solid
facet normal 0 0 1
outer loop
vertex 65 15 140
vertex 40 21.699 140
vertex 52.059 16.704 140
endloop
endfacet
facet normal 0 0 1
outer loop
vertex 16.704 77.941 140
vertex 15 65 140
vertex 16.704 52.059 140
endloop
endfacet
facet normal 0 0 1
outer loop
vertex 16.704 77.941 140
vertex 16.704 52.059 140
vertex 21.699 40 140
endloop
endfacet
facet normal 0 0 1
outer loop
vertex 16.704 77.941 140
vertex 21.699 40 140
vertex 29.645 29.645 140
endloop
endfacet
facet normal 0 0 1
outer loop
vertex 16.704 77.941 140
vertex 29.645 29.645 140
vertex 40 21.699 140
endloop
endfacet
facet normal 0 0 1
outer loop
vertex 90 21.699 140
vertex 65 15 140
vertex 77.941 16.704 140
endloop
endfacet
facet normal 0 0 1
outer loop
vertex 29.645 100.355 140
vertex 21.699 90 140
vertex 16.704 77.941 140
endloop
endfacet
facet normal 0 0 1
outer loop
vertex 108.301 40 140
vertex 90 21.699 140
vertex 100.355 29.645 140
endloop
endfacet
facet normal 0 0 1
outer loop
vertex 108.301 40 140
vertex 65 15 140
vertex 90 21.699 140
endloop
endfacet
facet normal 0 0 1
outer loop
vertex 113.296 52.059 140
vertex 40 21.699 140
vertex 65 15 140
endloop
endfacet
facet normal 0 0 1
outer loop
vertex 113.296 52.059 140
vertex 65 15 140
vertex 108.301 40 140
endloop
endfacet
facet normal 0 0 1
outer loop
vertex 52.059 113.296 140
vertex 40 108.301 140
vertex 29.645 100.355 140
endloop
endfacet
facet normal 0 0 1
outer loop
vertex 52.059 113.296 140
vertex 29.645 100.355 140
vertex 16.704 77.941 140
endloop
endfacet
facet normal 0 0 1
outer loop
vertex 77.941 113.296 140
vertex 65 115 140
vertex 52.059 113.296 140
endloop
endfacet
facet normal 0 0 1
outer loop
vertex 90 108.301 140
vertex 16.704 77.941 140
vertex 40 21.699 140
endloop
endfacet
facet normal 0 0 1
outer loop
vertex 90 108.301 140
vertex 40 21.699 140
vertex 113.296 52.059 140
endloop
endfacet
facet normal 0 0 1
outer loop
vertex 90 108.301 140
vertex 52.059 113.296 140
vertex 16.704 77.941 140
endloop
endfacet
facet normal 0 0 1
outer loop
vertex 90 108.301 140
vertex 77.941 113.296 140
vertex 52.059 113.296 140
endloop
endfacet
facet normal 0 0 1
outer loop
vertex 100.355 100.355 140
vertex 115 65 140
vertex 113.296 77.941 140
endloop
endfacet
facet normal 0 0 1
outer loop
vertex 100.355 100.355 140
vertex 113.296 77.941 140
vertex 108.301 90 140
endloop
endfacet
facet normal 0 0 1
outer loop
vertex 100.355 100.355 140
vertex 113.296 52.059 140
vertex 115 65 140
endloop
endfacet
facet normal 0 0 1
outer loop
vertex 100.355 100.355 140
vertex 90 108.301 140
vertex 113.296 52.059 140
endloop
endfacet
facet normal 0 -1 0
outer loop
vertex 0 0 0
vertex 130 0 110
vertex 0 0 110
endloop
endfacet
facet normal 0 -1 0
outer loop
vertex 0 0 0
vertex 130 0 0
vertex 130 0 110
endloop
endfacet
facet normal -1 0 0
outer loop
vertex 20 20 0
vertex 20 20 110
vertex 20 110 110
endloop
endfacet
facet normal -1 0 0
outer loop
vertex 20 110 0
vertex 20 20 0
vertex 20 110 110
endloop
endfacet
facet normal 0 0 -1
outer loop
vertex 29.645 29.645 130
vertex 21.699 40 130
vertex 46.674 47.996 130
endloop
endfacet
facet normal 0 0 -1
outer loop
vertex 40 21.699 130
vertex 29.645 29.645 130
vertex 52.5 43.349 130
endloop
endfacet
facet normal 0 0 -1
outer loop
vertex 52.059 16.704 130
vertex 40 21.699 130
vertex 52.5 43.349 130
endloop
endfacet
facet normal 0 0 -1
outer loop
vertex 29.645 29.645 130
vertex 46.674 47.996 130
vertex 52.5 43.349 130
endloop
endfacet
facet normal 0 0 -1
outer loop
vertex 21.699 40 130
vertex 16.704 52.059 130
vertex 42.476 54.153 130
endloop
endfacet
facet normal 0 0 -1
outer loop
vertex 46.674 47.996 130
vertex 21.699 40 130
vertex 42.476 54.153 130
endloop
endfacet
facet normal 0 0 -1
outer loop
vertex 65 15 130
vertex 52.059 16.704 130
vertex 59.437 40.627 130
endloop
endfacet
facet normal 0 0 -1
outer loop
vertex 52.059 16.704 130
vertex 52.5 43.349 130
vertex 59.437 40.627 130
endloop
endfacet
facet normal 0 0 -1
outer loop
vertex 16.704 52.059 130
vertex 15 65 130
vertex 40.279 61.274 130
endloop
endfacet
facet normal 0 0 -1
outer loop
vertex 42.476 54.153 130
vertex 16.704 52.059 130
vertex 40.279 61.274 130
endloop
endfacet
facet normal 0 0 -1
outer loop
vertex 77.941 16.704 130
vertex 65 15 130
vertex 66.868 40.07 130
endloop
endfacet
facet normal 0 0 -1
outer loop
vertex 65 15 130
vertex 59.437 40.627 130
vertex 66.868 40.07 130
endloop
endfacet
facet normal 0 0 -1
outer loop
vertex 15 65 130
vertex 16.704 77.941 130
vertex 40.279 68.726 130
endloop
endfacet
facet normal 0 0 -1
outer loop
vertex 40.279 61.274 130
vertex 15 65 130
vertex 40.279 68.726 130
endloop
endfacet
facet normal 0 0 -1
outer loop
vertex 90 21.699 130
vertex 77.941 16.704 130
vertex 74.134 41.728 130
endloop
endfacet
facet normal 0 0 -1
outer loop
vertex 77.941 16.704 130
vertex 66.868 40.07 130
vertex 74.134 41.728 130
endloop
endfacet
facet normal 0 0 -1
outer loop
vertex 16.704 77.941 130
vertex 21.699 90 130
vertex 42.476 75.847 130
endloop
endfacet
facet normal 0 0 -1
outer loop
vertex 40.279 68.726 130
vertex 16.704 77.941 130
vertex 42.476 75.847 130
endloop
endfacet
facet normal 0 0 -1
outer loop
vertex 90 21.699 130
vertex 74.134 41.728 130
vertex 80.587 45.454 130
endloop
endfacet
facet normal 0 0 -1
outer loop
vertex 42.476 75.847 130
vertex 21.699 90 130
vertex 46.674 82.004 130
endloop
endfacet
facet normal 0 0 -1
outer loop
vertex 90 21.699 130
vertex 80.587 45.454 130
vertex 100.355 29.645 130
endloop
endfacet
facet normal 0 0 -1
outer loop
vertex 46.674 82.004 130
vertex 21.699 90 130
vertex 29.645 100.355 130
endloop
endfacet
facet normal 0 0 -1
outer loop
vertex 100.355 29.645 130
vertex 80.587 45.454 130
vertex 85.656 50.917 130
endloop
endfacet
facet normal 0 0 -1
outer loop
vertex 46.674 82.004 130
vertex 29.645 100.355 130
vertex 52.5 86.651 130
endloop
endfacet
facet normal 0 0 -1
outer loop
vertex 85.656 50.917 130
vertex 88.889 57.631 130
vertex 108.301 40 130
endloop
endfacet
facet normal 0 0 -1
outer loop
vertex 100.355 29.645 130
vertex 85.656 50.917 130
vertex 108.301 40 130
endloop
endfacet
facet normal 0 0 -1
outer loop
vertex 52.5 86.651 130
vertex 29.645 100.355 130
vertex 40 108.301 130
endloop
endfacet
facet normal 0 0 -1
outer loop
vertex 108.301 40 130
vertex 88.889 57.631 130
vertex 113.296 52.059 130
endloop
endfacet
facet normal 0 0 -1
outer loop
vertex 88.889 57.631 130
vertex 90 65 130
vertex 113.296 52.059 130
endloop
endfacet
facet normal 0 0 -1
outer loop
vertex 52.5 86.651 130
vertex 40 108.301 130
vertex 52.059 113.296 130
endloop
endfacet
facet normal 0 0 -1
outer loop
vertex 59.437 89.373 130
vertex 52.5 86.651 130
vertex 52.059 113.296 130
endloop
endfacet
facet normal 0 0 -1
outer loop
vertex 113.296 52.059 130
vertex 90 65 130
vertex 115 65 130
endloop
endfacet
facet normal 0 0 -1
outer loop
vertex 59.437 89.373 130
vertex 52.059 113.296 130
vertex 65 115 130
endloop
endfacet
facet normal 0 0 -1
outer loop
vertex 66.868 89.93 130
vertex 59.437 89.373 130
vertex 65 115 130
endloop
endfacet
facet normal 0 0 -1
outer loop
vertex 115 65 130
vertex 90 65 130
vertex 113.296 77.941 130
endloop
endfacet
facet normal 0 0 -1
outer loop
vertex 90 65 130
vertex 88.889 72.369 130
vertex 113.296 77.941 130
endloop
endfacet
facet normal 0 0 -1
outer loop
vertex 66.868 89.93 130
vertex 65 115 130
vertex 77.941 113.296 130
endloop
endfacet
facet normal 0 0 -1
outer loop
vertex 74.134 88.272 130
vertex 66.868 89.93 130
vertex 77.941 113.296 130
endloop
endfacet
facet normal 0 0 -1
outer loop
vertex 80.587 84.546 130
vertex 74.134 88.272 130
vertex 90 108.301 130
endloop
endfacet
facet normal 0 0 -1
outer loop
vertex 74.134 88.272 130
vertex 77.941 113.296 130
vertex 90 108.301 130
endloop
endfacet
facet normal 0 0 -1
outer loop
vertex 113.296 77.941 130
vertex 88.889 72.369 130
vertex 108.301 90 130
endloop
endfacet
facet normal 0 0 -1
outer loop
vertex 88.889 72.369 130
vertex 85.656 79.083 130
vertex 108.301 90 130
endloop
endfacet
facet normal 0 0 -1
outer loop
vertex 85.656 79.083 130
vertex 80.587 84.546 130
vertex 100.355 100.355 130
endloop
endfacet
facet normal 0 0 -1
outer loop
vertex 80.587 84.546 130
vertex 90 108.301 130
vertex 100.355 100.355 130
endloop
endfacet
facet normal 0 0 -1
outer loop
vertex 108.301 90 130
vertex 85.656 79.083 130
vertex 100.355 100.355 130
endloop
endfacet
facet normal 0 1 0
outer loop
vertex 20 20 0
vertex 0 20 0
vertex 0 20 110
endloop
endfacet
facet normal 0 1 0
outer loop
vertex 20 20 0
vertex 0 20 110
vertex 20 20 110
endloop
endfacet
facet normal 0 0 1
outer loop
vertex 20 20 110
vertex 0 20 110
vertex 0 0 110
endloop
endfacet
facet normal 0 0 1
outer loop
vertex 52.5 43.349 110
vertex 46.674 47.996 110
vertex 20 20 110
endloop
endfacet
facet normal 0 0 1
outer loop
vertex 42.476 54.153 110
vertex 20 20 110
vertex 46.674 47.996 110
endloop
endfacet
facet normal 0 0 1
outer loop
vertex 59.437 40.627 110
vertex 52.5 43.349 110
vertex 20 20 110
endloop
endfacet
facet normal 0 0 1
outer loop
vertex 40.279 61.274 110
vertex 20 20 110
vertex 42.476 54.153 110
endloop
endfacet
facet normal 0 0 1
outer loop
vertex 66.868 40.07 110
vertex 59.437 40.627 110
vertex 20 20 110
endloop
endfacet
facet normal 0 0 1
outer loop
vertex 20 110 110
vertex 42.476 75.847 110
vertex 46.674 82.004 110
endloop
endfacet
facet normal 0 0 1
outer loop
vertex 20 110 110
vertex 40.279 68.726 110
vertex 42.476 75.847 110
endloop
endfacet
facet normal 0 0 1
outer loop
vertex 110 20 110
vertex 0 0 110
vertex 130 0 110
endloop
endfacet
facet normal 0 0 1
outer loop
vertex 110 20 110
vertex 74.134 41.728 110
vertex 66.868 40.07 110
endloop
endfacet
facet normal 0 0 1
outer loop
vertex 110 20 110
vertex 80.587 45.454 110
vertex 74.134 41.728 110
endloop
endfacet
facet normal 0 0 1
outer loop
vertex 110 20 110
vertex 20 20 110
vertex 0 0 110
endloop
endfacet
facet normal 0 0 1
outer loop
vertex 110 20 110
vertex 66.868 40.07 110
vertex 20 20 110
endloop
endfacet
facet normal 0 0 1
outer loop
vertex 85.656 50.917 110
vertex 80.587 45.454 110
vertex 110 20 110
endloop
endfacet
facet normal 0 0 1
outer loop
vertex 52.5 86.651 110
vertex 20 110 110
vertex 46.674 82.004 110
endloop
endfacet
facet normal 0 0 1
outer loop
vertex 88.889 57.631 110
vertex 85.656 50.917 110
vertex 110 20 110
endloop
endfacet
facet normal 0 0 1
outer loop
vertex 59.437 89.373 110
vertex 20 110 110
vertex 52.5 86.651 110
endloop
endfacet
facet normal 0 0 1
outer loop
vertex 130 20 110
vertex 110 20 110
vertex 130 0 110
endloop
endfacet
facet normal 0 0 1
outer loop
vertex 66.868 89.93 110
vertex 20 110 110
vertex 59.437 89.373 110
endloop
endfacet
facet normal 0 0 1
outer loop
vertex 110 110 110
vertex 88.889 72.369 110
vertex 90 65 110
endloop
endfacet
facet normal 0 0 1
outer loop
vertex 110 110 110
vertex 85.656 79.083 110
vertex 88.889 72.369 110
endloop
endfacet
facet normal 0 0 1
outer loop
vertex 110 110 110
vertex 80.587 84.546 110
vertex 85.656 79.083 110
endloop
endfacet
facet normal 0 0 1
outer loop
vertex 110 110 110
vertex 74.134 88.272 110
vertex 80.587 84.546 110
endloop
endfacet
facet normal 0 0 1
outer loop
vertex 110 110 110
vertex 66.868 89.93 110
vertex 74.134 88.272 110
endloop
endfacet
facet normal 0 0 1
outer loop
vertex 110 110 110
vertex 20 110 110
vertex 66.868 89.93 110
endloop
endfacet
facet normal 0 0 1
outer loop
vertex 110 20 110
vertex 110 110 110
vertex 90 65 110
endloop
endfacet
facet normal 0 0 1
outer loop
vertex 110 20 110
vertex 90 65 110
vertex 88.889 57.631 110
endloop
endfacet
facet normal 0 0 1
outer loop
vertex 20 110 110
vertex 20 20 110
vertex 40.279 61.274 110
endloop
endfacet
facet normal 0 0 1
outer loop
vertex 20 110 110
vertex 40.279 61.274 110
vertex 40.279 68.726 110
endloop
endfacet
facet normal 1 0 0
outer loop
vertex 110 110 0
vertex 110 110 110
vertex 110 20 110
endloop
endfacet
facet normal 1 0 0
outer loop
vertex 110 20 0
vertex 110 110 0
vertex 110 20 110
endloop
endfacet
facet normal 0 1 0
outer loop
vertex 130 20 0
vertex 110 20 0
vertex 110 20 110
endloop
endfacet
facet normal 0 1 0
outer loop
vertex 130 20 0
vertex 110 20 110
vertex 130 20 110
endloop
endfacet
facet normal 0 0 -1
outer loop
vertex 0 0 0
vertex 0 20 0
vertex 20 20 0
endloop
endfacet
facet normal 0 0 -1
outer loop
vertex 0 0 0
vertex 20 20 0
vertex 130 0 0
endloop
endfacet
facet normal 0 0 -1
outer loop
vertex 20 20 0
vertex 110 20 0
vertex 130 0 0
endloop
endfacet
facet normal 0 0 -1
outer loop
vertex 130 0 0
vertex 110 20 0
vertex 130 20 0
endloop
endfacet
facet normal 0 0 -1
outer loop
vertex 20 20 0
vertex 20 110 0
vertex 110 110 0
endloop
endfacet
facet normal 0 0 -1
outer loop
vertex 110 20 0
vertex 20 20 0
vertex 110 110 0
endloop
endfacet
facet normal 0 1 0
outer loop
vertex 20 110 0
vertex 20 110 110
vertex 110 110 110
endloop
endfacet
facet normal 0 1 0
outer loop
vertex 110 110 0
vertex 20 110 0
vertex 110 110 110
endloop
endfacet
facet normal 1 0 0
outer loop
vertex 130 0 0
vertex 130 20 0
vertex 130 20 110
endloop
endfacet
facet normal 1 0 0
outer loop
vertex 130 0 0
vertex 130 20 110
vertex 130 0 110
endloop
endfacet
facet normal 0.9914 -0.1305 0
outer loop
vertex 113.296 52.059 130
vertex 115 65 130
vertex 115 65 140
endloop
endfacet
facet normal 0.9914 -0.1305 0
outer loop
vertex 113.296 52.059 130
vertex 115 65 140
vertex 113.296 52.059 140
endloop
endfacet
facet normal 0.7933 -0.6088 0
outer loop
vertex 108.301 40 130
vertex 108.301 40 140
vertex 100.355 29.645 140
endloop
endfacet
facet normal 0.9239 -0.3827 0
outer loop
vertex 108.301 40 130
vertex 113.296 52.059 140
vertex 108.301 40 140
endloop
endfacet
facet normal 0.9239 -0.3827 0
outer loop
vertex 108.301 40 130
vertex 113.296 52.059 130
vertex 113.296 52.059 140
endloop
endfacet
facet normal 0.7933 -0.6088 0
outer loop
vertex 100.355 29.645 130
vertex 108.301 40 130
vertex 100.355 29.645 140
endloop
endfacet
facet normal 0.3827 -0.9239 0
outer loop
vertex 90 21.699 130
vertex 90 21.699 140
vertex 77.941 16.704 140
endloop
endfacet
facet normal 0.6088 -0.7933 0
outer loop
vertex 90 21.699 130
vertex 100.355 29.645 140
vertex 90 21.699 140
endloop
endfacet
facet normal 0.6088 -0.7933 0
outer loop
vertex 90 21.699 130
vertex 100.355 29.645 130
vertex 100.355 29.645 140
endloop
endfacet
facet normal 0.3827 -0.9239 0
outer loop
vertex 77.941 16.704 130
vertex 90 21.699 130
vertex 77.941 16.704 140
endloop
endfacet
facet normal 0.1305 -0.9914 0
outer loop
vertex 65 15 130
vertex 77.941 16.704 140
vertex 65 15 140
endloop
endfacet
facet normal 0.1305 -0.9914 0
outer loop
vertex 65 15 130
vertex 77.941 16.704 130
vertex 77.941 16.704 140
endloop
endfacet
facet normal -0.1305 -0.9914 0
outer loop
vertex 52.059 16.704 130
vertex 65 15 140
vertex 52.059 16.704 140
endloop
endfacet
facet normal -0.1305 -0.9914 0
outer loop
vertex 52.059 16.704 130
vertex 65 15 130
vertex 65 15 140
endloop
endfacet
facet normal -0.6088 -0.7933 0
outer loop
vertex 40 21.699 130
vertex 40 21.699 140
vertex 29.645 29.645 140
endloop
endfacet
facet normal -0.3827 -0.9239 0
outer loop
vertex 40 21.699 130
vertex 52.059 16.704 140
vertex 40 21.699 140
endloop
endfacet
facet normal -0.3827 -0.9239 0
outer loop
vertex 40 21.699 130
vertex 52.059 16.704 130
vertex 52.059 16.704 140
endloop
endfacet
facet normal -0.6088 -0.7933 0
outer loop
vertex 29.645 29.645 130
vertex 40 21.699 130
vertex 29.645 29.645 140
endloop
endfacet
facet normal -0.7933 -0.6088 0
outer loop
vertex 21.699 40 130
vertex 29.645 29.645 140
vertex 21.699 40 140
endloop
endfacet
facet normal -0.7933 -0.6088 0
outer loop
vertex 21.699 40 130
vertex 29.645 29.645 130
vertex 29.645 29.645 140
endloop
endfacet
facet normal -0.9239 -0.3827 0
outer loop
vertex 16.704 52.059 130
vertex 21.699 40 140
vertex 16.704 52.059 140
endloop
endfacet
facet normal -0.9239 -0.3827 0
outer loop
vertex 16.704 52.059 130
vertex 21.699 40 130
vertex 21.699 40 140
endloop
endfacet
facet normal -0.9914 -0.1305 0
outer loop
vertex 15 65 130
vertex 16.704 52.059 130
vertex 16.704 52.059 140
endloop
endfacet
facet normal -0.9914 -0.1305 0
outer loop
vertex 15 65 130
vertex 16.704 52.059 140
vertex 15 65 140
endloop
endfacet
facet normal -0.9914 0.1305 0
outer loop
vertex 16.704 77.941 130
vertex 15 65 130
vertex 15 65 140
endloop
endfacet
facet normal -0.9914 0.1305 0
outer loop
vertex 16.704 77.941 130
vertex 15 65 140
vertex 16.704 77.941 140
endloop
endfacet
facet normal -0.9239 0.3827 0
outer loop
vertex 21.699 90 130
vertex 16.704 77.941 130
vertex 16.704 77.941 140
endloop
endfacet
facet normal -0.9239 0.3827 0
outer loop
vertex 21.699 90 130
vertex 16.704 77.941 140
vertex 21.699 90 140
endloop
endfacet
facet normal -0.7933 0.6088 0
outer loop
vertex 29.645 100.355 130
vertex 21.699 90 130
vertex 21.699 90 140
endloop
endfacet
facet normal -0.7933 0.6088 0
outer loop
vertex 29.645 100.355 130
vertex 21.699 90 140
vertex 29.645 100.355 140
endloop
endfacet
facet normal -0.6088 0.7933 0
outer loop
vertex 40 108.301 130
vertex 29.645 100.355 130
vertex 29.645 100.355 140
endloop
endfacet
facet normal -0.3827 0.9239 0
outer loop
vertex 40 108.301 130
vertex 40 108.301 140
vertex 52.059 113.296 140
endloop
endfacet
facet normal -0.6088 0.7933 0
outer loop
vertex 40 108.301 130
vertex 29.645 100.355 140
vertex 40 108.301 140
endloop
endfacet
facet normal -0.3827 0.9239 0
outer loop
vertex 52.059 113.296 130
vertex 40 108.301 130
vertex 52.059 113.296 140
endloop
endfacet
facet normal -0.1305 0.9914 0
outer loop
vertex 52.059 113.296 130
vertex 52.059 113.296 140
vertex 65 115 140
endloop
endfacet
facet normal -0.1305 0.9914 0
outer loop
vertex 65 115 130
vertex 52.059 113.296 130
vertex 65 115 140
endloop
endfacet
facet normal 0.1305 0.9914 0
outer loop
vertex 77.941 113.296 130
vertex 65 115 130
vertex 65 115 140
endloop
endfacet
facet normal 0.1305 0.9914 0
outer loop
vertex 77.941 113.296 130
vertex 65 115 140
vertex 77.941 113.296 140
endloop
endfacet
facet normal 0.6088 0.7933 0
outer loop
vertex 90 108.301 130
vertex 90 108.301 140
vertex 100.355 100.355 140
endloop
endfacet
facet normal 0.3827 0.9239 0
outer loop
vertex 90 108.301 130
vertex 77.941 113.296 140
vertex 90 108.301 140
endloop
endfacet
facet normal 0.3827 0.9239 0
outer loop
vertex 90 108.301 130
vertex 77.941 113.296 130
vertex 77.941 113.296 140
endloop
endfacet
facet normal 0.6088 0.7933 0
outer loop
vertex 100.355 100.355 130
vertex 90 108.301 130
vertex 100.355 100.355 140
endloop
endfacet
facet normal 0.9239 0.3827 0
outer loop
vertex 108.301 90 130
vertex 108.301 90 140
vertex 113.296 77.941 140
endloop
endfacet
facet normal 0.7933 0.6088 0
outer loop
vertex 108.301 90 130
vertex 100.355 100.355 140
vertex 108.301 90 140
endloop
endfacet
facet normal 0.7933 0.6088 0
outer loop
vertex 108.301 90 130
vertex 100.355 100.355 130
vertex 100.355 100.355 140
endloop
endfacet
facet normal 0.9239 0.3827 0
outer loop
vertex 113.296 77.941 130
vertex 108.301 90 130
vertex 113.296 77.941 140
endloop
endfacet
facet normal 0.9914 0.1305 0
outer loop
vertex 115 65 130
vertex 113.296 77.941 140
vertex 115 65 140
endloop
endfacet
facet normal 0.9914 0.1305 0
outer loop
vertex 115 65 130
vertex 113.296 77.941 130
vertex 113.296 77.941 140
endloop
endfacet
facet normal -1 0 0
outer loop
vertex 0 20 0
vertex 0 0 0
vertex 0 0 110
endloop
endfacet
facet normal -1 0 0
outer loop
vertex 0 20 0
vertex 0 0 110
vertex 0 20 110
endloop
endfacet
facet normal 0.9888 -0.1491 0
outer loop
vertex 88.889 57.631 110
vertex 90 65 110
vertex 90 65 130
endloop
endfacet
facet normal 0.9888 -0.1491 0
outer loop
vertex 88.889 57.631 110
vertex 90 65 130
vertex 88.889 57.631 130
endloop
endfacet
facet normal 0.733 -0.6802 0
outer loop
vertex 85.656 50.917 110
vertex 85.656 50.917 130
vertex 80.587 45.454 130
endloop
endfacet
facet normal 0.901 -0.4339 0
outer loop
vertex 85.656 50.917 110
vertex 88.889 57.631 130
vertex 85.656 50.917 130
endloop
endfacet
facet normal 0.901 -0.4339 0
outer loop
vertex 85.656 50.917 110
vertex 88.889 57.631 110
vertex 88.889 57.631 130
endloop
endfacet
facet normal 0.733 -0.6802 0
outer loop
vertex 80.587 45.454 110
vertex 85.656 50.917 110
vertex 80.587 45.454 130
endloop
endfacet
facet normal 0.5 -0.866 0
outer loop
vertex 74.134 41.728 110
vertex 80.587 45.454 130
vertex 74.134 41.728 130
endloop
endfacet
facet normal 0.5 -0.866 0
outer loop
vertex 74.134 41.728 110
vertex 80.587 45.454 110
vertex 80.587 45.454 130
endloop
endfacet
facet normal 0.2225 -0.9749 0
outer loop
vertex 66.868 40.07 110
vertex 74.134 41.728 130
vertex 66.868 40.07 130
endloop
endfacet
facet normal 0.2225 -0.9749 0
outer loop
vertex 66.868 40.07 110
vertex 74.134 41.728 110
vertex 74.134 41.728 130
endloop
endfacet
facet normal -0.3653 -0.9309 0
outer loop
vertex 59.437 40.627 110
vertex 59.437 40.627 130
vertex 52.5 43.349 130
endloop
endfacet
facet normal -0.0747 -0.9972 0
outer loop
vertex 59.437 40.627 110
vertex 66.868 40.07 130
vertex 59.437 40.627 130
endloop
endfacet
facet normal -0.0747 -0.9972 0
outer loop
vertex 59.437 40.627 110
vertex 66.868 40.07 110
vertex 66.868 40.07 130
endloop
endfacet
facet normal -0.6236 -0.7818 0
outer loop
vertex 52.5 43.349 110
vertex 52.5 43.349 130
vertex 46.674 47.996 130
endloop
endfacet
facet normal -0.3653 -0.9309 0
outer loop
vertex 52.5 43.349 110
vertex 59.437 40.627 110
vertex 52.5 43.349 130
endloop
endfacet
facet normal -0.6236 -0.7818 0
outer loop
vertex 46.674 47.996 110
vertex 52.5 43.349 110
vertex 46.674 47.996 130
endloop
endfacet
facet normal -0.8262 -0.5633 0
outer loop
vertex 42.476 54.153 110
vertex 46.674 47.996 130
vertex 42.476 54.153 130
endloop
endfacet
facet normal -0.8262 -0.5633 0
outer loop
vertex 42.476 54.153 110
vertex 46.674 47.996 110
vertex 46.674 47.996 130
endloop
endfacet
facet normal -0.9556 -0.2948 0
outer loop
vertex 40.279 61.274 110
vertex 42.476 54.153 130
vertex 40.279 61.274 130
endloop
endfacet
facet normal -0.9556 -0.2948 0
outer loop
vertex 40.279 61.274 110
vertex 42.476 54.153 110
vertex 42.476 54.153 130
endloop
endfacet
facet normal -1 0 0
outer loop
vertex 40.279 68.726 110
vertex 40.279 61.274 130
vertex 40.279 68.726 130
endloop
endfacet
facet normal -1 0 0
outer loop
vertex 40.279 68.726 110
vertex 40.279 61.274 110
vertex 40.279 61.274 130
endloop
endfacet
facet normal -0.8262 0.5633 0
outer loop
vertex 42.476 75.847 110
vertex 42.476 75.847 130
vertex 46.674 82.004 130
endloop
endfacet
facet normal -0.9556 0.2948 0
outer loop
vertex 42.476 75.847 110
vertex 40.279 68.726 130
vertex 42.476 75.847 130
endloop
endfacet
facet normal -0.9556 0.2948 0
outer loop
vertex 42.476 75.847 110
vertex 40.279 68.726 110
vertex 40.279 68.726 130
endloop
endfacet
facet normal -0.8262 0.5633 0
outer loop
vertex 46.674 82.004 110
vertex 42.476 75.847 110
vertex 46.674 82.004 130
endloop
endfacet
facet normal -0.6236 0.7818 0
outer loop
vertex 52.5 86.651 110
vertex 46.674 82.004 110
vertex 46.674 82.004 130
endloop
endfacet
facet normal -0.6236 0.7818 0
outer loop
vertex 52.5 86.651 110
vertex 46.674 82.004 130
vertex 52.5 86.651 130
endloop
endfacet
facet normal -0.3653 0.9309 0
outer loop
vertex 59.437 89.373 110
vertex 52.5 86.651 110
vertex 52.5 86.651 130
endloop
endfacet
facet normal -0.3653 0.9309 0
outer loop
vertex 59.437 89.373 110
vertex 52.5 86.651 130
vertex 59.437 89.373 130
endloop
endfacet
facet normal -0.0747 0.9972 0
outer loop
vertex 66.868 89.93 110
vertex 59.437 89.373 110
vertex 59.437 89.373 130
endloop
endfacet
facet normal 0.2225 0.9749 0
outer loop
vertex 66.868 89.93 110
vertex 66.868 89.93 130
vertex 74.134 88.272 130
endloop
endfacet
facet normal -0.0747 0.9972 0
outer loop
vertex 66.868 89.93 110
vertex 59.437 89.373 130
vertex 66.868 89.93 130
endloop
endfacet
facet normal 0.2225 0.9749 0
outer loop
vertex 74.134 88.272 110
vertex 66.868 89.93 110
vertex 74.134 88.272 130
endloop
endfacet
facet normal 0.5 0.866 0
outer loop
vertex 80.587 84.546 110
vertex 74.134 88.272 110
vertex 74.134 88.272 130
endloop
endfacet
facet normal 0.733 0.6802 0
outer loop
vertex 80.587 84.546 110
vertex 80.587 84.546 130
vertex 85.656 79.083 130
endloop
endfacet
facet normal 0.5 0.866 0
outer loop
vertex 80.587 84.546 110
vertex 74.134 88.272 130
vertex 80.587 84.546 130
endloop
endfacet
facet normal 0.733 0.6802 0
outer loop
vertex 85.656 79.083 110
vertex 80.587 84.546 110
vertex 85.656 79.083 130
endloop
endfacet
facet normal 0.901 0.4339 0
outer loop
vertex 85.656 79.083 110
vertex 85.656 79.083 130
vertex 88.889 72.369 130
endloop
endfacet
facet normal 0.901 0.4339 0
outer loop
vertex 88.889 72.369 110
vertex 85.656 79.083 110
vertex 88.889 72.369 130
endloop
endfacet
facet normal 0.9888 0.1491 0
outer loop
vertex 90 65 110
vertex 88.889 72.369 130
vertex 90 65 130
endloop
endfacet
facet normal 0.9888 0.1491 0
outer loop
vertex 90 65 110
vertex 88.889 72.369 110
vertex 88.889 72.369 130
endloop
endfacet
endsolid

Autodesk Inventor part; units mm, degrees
ref_plane "YZ Plane" through (0, 0, 0) normal (1, 0, 0) x (0, 1, 0)
ref_plane "XZ Plane" through (0, 0, 0) normal (0, 1, 0) x (-1, 0, 0)
ref_plane "XY Plane" through (0, 0, 0) normal (0, 0, 1) x (1, 0, 0)
sketch "Sketch1" plane through (0, 0, 0) normal (0, 0, 1) x (1, 0, 0)
  line L0 (0, 0) -> (0, 20)
  line L1 (0, 20) -> (20, 20)
  line L2 (20, 20) -> (20, 110)
  line L3 (20, 110) -> (110, 110)
  line L4 (110, 110) -> (110, 20)
  line L5 (110, 20) -> (130, 20)
  line L6 (130, 20) -> (130, 0)
  line L7 (130, 0) -> (0, 0)
  dimension "d0" = 20
  dimension "d1" = 110
  dimension "d2" = 90
  dimension "d3" = 130
extrude "Extrusion1" add sketch "Sketch1" along normal blind 110
sketch "Sketch2" plane through (0, 0, 110) normal (0, 0, 1) x (1, 0, 0)
  line L0 (110, 110) -> (20, 110) projected
  line L1 (0, 0) -> (130, 0) projected
  circle A0 centre (65, 65) radius 25
  line L2 (65, 65) -> (65, 0) construction
  line L3 (0, 0) -> (130, 0) construction
  dimension "d6" = 65
  dimension "d7" = 50
extrude "Extrusion2" add sketch "Sketch2" along normal blind 20
sketch "Sketch3" plane through (65, 65, 130) normal (0, 0, 1) x (1, 0, 0)
  circle A0 centre (0, 0) radius 50
  circle A1 centre (0, 0) radius 25 projected
  point P0 (-65, -65)
  dimension "d10" = 100
extrude "Extrusion3" add sketch "Sketch3" along normal blind 10 contours A0 | A1
properties part number "A_Gearbox"
